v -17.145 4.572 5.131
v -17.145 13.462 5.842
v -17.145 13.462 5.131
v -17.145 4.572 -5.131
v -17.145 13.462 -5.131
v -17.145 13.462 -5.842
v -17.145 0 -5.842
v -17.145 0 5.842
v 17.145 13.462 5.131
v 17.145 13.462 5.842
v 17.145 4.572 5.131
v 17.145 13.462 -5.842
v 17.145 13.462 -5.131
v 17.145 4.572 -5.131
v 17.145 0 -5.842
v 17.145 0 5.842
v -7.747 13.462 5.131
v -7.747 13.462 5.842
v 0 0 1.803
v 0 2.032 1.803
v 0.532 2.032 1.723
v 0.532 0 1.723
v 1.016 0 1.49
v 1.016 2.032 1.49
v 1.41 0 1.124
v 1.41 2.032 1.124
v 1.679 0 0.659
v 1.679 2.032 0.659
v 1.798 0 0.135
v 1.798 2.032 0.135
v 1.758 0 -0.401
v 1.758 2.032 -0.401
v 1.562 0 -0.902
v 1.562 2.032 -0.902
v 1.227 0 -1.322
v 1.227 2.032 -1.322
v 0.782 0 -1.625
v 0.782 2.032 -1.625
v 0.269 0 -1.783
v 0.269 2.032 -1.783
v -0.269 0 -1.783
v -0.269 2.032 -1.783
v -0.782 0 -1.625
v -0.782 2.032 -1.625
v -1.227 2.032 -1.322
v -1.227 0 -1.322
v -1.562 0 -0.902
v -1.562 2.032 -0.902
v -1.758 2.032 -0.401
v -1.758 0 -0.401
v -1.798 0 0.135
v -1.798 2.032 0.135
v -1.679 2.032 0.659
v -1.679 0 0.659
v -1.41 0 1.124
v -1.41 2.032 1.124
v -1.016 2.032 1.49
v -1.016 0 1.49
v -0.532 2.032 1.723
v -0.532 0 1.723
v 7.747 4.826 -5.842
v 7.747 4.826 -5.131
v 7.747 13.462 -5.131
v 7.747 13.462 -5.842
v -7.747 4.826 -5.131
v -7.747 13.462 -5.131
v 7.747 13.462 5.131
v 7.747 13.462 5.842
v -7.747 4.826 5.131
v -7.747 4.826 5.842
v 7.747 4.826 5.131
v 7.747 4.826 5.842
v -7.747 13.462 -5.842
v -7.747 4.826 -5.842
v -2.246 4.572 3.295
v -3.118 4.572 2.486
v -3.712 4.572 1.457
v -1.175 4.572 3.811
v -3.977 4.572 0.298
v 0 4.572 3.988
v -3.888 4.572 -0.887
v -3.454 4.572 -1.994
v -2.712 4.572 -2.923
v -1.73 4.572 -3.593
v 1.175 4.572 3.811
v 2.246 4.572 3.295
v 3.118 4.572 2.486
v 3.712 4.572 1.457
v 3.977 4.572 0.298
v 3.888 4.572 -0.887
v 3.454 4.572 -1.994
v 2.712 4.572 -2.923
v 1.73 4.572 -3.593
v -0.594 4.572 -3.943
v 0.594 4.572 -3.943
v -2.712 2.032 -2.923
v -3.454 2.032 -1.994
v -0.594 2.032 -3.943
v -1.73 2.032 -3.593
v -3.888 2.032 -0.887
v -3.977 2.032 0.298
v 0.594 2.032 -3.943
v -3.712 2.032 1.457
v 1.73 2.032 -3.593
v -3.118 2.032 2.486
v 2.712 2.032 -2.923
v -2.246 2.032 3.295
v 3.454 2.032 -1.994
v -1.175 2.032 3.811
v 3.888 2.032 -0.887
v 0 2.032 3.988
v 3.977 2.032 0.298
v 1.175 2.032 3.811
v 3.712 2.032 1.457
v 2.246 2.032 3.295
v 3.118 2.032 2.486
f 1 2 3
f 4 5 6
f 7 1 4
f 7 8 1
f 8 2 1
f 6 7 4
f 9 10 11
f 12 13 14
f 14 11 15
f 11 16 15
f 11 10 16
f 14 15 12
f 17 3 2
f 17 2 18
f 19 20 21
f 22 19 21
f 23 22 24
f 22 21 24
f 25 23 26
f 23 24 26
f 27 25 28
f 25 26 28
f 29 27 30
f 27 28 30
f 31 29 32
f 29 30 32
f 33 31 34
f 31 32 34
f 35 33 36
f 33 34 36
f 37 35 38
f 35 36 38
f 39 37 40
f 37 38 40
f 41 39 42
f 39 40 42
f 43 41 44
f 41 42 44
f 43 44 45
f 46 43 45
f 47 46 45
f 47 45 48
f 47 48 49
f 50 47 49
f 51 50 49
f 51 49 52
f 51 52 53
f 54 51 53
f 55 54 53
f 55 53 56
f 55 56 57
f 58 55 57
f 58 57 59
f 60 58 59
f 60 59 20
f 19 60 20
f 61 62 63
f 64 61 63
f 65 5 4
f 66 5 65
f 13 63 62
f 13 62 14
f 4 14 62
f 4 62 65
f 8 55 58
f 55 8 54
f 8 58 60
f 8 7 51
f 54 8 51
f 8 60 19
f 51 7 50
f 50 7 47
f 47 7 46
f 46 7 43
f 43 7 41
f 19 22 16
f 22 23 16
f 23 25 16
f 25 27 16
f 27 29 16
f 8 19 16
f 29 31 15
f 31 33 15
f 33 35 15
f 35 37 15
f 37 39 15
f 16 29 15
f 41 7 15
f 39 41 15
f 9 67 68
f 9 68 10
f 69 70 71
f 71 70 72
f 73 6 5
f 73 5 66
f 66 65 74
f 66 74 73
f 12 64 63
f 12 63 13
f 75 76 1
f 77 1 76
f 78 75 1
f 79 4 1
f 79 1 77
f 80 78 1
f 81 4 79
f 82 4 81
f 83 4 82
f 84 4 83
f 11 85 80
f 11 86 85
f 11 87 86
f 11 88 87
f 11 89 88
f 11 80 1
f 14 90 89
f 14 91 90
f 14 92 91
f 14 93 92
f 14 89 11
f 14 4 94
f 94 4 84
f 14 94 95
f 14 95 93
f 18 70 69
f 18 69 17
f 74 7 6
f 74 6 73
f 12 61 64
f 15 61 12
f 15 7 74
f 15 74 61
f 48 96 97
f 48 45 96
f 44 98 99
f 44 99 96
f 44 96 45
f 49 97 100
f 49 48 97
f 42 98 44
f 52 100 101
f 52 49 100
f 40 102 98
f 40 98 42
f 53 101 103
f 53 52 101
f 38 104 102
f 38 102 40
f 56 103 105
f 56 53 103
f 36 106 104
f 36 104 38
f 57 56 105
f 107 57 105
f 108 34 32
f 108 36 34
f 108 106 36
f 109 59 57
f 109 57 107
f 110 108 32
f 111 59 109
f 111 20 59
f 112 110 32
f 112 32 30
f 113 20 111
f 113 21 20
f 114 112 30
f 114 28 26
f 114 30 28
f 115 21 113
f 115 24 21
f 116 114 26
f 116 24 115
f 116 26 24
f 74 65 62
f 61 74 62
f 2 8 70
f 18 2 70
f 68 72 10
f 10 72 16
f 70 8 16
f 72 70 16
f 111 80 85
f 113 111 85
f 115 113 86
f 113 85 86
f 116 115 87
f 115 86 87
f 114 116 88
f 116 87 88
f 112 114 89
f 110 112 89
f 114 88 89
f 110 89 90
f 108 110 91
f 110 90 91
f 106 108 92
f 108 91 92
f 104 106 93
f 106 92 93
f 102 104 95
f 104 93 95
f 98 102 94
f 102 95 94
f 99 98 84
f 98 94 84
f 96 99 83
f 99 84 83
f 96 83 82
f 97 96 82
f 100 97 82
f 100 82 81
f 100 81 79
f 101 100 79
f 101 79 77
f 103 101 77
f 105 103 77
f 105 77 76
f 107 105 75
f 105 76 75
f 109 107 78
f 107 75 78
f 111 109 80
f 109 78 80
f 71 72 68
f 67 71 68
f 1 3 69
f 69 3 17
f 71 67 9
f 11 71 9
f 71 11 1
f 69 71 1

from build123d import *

# Parameters (mm, degrees)
SKETCH1_W           = 34.29
SKETCH1_H           = 11.684
BOSS_EXTRUDE1_DEPTH = 13.462
SKETCH3_W           = 15.494
SKETCH3_H           = 8.636
CUT_EXTRUDE1_DEPTH  = 23.622
SKETCH4_W           = 34.29
SKETCH4_H           = 10.2616
CUT_EXTRUDE2_DEPTH  = 8.89
SKETCH5_R           = 3.9878
CUT_EXTRUDE3_DEPTH  = 2.54
SKETCH6_R           = 1.8034
CUT_EXTRUDE4_DEPTH  = 7.62


with BuildPart() as part:
    # Sketch1 → Boss-Extrude1 (new body)
    with BuildSketch(Plane(origin=(0, 0, 0), x_dir=(1, 0, 0), z_dir=(0, 1, 0))):
        Rectangle(SKETCH1_W, SKETCH1_H)
    extrude(amount=BOSS_EXTRUDE1_DEPTH)

    # Sketch3 → Cut-Extrude1 (cut)
    with BuildSketch(Plane.XY.offset(5.842)):
        with Locations((0, 9.144)):
            Rectangle(SKETCH3_W, SKETCH3_H)
    extrude(amount=-CUT_EXTRUDE1_DEPTH, mode=Mode.SUBTRACT)

    # Sketch4 → Cut-Extrude2 (cut)
    with BuildSketch(Plane(origin=(0, 13.462, 0), x_dir=(1, 0, 0), z_dir=(0, 1, 0))):
        Rectangle(SKETCH4_W, SKETCH4_H)
    extrude(amount=-CUT_EXTRUDE2_DEPTH, mode=Mode.SUBTRACT)

    # Sketch5 → Cut-Extrude3 (cut)
    with BuildSketch(Plane(origin=(0, 4.572, 0), x_dir=(1, 0, 0), z_dir=(0, 1, 0))):
        with Locations(Location((0, 0, 0), (0, 0, 270))):
            Circle(SKETCH5_R)
    extrude(amount=-CUT_EXTRUDE3_DEPTH, mode=Mode.SUBTRACT)

    # Sketch6 → Cut-Extrude4 (cut)
    with BuildSketch(Plane(origin=(0, 2.032, 0), x_dir=(1, 0, 0), z_dir=(0, 1, 0))):
        with Locations(Location((0, 0, 0), (0, 0, 270))):
            Circle(SKETCH6_R)
    extrude(amount=-CUT_EXTRUDE4_DEPTH, mode=Mode.SUBTRACT)


solid = part.part
